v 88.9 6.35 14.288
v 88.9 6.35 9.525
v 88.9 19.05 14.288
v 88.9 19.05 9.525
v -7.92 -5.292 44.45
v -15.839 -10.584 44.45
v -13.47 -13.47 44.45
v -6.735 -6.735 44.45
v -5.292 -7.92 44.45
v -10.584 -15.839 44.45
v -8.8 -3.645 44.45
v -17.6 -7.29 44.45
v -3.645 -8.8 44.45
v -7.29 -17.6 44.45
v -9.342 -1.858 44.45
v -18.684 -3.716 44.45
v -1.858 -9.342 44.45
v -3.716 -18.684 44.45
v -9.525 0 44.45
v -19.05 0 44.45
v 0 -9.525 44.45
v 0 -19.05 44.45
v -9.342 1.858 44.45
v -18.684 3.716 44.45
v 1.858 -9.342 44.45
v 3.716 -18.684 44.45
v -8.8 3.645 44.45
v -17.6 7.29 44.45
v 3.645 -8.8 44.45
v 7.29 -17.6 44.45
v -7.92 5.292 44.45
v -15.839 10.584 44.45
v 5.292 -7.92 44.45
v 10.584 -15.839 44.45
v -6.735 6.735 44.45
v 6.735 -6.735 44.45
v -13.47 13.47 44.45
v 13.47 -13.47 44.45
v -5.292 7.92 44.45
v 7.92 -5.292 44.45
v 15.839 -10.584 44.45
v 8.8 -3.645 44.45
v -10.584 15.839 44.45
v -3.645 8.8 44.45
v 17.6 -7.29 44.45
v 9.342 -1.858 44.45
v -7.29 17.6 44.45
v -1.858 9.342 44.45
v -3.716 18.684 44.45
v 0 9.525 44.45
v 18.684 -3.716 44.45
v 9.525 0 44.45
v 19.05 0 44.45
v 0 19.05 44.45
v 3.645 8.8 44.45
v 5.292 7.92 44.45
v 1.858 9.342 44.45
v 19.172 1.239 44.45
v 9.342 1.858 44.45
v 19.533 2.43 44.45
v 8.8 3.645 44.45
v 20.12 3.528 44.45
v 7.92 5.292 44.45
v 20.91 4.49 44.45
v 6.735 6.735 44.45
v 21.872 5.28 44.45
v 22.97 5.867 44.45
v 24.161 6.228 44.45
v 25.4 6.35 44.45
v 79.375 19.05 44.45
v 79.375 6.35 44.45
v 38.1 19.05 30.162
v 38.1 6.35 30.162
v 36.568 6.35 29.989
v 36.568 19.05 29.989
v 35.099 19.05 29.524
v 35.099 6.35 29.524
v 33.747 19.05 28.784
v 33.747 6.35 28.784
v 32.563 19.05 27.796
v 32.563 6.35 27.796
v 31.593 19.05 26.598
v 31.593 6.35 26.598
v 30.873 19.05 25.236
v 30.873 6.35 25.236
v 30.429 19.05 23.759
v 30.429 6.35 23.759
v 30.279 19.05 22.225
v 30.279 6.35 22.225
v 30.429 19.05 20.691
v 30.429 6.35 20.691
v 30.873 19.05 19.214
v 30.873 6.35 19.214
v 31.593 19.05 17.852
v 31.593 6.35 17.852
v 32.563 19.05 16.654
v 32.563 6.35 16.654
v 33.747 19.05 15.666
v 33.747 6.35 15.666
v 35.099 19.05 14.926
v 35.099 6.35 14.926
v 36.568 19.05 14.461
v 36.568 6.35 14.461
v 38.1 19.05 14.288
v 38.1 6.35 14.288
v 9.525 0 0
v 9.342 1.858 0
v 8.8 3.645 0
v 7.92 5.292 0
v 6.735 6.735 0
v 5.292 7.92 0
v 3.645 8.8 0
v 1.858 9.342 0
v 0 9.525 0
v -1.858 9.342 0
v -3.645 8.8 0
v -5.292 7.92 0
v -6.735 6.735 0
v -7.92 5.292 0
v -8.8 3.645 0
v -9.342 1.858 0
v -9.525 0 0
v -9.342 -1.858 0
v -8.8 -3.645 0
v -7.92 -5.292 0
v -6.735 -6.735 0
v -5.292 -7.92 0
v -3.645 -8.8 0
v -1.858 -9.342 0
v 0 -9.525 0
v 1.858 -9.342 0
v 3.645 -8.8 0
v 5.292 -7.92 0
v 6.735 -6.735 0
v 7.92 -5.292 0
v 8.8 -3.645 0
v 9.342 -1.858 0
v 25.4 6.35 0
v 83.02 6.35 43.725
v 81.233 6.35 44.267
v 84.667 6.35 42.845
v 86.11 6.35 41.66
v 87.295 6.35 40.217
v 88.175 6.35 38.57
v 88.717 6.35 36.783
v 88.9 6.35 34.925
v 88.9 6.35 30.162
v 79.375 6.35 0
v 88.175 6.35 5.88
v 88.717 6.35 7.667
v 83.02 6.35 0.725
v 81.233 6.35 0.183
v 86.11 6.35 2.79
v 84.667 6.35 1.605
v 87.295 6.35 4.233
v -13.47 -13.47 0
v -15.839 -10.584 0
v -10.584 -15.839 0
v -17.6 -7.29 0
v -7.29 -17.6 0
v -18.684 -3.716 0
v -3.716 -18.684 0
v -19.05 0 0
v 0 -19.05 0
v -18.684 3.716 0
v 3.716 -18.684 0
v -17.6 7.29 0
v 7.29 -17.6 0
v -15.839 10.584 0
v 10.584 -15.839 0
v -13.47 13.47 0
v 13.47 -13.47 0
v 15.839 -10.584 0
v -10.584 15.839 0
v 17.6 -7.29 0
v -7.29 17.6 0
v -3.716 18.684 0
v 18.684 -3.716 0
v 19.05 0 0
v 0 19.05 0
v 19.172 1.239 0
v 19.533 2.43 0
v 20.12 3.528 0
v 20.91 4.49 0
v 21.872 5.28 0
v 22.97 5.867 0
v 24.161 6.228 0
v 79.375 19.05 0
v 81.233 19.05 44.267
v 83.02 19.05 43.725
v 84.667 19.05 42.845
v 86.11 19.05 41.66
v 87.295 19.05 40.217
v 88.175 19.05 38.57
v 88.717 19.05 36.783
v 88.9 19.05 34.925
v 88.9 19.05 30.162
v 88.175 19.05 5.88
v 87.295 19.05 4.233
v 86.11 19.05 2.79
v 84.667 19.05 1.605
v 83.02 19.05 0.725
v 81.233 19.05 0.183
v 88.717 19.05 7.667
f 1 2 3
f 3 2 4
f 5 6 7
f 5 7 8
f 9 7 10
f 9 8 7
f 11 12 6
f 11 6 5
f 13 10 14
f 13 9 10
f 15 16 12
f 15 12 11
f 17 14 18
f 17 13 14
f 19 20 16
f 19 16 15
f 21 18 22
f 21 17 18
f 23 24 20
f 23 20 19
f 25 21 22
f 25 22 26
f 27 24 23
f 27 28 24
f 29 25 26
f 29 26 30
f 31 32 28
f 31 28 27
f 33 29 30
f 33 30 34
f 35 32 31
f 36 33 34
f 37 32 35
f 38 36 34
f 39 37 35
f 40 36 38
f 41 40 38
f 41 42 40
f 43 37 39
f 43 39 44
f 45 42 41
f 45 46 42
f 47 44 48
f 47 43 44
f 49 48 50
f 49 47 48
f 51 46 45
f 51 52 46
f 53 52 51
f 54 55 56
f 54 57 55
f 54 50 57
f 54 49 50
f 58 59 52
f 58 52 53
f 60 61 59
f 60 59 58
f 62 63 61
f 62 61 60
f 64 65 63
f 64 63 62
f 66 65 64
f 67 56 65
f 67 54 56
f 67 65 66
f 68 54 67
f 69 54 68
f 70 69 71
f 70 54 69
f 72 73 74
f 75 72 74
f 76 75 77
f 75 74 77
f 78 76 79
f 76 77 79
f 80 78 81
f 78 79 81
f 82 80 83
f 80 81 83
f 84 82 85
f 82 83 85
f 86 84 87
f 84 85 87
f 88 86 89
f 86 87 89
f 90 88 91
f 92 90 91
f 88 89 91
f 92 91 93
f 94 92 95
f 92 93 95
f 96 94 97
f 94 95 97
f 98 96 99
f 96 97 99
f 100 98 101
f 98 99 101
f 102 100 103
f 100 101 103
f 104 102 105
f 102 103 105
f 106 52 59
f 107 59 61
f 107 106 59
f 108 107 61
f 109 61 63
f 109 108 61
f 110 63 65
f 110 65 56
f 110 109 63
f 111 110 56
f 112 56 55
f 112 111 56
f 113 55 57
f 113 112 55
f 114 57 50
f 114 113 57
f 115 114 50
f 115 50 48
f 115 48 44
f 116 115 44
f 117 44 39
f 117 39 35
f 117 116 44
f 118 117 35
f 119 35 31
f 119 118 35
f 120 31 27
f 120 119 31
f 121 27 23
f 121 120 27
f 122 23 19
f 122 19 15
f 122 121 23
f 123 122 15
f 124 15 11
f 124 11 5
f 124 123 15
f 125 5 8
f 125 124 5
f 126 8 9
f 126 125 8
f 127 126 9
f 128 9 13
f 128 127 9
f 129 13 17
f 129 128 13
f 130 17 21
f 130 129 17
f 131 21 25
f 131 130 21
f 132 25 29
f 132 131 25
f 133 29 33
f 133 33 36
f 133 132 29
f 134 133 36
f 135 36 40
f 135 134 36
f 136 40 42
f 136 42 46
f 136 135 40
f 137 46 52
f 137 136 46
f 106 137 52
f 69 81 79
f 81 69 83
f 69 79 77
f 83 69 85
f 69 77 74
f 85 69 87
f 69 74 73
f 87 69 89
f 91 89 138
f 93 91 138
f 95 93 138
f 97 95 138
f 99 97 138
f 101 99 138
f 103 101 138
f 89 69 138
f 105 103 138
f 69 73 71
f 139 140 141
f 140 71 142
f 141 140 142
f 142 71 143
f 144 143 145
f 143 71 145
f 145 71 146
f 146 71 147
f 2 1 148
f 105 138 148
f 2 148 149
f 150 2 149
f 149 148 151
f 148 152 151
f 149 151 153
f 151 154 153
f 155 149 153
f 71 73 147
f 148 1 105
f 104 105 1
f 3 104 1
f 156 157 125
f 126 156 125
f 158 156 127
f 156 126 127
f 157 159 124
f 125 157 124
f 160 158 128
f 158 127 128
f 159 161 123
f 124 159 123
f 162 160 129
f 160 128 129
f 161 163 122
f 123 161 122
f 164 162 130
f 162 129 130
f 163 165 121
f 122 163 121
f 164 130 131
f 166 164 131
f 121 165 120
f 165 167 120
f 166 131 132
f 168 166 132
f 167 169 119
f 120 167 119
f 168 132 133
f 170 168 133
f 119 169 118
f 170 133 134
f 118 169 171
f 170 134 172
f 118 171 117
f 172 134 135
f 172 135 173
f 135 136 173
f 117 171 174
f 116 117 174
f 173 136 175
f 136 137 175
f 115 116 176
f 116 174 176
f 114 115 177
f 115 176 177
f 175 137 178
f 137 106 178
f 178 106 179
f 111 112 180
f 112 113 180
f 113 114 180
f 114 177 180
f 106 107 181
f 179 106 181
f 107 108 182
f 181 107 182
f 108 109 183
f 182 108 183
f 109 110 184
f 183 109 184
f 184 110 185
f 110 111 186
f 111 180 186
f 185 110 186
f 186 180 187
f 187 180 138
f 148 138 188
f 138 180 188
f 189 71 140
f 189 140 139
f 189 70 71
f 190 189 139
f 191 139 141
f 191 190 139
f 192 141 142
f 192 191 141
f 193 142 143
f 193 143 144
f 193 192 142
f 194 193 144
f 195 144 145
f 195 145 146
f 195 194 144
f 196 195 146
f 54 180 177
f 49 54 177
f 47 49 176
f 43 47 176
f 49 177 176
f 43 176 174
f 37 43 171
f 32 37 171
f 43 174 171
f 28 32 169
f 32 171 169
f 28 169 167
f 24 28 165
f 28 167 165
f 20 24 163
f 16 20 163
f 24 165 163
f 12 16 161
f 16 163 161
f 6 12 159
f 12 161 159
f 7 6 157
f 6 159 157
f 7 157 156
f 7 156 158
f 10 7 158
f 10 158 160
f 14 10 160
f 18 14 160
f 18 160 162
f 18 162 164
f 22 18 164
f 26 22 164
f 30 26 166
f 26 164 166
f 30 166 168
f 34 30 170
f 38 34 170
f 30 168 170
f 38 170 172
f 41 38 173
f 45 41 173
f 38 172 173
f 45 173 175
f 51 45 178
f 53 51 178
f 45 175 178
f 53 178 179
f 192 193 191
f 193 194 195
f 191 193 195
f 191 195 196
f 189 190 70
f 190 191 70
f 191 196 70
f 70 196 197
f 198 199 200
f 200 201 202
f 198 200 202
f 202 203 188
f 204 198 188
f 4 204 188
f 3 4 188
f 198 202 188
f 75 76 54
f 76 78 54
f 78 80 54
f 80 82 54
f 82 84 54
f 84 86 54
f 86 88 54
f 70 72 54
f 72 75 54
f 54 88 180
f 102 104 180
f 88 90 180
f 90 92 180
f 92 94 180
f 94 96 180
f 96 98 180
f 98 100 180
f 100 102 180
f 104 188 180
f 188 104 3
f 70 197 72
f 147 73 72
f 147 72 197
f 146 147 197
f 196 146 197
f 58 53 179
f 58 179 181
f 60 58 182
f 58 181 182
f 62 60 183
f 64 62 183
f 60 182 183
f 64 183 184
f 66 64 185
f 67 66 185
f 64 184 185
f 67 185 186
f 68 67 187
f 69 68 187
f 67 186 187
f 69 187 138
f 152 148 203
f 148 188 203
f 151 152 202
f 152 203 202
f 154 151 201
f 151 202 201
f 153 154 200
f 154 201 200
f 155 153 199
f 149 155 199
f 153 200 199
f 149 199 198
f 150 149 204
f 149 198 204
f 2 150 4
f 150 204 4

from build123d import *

# Parameters (mm, degrees)
F0_R        = 9.525
F1_DEPTH    = 44.45
F2_W        = 50.8
F2_H        = 15.875
F4_DEPTH    = 12.7
F5_R        = 9.525
F6_T1_DEPTH = 44.45


# Not quite as in the source:
# - a fillet or chamfer that OpenCascade refuses, or shapes differently, is made with other operations: its cross-section is extruded or revolved along the edge and cut away or added
# - a length typed as a fraction of an inch, garbled in the dataset ("3 / 203.2 mm" for 3/8 in), is restored


with BuildPart() as f1:
    # F0 (on Top) → F1 (new body)
    with BuildSketch(Plane.XY):
        with BuildLine():
            ThreePointArc((0, 19.05), (-13.4703841816, -13.4703841816), (19.05, 0))
            ThreePointArc((19.05, 0), (18.7756525614, 3.2213926947), (17.9605122421, 6.35))
            ThreePointArc((17.9605122421, 6.35), (10.9985226281, 15.5542598667), (0, 19.05))
        make_face()
        Circle(F0_R, mode=Mode.SUBTRACT)
        with BuildLine():
            ThreePointArc((0, 19.05), (10.9985226281, 15.5542598667), (17.9605122421, 6.35))
            Line((17.9605122421, 6.35), (88.9, 6.35))
            Line((88.9, 6.35), (88.9, 19.05))
            Line((88.9, 19.05), (0, 19.05))
        make_face()
    extrude(amount=F1_DEPTH)

    # F3 (on face) + F2 (on face) → F4 (cut)
    with BuildSketch(Plane.XZ.offset(-6.35)):
        with BuildLine():
            Line((38.1, 14.2883619165), (38.1, 30.1616380835))
            ThreePointArc((38.1, 30.1616380835), (30.279470861, 22.225), (38.1, 14.2883619165))
        make_face()
    with BuildSketch(Plane.XZ.offset(-6.35)):
        with Locations((63.5, 22.225)):
            Rectangle(F2_W, F2_H)
    extrude(amount=-F4_DEPTH, mode=Mode.SUBTRACT)

    # F5
    f5_edges = [f1.edges().sort_by_distance(p)[0] for p in [
        (88.9, 12.7, 44.45),
        (88.9, 12.7, 0),
    ]]
    fillet(f5_edges, radius=F5_R)

    # F6: fillet of radius 6.35 on 1 edges, made by hand

    # F6_s2 → F6_t1 (join)
    with BuildSketch(Plane.XY):
        with BuildLine():
            ThreePointArc((19.05, 0), (20.9098719395, 4.4901280605), (25.4, 6.35))
            Line((25.4, 6.35), (17.9605122421, 6.35))
            ThreePointArc((17.9605122421, 6.35), (18.7756525614, 3.2213926947), (19.05, 0))
        make_face()
    extrude(amount=F6_T1_DEPTH)


solid = f1.part
